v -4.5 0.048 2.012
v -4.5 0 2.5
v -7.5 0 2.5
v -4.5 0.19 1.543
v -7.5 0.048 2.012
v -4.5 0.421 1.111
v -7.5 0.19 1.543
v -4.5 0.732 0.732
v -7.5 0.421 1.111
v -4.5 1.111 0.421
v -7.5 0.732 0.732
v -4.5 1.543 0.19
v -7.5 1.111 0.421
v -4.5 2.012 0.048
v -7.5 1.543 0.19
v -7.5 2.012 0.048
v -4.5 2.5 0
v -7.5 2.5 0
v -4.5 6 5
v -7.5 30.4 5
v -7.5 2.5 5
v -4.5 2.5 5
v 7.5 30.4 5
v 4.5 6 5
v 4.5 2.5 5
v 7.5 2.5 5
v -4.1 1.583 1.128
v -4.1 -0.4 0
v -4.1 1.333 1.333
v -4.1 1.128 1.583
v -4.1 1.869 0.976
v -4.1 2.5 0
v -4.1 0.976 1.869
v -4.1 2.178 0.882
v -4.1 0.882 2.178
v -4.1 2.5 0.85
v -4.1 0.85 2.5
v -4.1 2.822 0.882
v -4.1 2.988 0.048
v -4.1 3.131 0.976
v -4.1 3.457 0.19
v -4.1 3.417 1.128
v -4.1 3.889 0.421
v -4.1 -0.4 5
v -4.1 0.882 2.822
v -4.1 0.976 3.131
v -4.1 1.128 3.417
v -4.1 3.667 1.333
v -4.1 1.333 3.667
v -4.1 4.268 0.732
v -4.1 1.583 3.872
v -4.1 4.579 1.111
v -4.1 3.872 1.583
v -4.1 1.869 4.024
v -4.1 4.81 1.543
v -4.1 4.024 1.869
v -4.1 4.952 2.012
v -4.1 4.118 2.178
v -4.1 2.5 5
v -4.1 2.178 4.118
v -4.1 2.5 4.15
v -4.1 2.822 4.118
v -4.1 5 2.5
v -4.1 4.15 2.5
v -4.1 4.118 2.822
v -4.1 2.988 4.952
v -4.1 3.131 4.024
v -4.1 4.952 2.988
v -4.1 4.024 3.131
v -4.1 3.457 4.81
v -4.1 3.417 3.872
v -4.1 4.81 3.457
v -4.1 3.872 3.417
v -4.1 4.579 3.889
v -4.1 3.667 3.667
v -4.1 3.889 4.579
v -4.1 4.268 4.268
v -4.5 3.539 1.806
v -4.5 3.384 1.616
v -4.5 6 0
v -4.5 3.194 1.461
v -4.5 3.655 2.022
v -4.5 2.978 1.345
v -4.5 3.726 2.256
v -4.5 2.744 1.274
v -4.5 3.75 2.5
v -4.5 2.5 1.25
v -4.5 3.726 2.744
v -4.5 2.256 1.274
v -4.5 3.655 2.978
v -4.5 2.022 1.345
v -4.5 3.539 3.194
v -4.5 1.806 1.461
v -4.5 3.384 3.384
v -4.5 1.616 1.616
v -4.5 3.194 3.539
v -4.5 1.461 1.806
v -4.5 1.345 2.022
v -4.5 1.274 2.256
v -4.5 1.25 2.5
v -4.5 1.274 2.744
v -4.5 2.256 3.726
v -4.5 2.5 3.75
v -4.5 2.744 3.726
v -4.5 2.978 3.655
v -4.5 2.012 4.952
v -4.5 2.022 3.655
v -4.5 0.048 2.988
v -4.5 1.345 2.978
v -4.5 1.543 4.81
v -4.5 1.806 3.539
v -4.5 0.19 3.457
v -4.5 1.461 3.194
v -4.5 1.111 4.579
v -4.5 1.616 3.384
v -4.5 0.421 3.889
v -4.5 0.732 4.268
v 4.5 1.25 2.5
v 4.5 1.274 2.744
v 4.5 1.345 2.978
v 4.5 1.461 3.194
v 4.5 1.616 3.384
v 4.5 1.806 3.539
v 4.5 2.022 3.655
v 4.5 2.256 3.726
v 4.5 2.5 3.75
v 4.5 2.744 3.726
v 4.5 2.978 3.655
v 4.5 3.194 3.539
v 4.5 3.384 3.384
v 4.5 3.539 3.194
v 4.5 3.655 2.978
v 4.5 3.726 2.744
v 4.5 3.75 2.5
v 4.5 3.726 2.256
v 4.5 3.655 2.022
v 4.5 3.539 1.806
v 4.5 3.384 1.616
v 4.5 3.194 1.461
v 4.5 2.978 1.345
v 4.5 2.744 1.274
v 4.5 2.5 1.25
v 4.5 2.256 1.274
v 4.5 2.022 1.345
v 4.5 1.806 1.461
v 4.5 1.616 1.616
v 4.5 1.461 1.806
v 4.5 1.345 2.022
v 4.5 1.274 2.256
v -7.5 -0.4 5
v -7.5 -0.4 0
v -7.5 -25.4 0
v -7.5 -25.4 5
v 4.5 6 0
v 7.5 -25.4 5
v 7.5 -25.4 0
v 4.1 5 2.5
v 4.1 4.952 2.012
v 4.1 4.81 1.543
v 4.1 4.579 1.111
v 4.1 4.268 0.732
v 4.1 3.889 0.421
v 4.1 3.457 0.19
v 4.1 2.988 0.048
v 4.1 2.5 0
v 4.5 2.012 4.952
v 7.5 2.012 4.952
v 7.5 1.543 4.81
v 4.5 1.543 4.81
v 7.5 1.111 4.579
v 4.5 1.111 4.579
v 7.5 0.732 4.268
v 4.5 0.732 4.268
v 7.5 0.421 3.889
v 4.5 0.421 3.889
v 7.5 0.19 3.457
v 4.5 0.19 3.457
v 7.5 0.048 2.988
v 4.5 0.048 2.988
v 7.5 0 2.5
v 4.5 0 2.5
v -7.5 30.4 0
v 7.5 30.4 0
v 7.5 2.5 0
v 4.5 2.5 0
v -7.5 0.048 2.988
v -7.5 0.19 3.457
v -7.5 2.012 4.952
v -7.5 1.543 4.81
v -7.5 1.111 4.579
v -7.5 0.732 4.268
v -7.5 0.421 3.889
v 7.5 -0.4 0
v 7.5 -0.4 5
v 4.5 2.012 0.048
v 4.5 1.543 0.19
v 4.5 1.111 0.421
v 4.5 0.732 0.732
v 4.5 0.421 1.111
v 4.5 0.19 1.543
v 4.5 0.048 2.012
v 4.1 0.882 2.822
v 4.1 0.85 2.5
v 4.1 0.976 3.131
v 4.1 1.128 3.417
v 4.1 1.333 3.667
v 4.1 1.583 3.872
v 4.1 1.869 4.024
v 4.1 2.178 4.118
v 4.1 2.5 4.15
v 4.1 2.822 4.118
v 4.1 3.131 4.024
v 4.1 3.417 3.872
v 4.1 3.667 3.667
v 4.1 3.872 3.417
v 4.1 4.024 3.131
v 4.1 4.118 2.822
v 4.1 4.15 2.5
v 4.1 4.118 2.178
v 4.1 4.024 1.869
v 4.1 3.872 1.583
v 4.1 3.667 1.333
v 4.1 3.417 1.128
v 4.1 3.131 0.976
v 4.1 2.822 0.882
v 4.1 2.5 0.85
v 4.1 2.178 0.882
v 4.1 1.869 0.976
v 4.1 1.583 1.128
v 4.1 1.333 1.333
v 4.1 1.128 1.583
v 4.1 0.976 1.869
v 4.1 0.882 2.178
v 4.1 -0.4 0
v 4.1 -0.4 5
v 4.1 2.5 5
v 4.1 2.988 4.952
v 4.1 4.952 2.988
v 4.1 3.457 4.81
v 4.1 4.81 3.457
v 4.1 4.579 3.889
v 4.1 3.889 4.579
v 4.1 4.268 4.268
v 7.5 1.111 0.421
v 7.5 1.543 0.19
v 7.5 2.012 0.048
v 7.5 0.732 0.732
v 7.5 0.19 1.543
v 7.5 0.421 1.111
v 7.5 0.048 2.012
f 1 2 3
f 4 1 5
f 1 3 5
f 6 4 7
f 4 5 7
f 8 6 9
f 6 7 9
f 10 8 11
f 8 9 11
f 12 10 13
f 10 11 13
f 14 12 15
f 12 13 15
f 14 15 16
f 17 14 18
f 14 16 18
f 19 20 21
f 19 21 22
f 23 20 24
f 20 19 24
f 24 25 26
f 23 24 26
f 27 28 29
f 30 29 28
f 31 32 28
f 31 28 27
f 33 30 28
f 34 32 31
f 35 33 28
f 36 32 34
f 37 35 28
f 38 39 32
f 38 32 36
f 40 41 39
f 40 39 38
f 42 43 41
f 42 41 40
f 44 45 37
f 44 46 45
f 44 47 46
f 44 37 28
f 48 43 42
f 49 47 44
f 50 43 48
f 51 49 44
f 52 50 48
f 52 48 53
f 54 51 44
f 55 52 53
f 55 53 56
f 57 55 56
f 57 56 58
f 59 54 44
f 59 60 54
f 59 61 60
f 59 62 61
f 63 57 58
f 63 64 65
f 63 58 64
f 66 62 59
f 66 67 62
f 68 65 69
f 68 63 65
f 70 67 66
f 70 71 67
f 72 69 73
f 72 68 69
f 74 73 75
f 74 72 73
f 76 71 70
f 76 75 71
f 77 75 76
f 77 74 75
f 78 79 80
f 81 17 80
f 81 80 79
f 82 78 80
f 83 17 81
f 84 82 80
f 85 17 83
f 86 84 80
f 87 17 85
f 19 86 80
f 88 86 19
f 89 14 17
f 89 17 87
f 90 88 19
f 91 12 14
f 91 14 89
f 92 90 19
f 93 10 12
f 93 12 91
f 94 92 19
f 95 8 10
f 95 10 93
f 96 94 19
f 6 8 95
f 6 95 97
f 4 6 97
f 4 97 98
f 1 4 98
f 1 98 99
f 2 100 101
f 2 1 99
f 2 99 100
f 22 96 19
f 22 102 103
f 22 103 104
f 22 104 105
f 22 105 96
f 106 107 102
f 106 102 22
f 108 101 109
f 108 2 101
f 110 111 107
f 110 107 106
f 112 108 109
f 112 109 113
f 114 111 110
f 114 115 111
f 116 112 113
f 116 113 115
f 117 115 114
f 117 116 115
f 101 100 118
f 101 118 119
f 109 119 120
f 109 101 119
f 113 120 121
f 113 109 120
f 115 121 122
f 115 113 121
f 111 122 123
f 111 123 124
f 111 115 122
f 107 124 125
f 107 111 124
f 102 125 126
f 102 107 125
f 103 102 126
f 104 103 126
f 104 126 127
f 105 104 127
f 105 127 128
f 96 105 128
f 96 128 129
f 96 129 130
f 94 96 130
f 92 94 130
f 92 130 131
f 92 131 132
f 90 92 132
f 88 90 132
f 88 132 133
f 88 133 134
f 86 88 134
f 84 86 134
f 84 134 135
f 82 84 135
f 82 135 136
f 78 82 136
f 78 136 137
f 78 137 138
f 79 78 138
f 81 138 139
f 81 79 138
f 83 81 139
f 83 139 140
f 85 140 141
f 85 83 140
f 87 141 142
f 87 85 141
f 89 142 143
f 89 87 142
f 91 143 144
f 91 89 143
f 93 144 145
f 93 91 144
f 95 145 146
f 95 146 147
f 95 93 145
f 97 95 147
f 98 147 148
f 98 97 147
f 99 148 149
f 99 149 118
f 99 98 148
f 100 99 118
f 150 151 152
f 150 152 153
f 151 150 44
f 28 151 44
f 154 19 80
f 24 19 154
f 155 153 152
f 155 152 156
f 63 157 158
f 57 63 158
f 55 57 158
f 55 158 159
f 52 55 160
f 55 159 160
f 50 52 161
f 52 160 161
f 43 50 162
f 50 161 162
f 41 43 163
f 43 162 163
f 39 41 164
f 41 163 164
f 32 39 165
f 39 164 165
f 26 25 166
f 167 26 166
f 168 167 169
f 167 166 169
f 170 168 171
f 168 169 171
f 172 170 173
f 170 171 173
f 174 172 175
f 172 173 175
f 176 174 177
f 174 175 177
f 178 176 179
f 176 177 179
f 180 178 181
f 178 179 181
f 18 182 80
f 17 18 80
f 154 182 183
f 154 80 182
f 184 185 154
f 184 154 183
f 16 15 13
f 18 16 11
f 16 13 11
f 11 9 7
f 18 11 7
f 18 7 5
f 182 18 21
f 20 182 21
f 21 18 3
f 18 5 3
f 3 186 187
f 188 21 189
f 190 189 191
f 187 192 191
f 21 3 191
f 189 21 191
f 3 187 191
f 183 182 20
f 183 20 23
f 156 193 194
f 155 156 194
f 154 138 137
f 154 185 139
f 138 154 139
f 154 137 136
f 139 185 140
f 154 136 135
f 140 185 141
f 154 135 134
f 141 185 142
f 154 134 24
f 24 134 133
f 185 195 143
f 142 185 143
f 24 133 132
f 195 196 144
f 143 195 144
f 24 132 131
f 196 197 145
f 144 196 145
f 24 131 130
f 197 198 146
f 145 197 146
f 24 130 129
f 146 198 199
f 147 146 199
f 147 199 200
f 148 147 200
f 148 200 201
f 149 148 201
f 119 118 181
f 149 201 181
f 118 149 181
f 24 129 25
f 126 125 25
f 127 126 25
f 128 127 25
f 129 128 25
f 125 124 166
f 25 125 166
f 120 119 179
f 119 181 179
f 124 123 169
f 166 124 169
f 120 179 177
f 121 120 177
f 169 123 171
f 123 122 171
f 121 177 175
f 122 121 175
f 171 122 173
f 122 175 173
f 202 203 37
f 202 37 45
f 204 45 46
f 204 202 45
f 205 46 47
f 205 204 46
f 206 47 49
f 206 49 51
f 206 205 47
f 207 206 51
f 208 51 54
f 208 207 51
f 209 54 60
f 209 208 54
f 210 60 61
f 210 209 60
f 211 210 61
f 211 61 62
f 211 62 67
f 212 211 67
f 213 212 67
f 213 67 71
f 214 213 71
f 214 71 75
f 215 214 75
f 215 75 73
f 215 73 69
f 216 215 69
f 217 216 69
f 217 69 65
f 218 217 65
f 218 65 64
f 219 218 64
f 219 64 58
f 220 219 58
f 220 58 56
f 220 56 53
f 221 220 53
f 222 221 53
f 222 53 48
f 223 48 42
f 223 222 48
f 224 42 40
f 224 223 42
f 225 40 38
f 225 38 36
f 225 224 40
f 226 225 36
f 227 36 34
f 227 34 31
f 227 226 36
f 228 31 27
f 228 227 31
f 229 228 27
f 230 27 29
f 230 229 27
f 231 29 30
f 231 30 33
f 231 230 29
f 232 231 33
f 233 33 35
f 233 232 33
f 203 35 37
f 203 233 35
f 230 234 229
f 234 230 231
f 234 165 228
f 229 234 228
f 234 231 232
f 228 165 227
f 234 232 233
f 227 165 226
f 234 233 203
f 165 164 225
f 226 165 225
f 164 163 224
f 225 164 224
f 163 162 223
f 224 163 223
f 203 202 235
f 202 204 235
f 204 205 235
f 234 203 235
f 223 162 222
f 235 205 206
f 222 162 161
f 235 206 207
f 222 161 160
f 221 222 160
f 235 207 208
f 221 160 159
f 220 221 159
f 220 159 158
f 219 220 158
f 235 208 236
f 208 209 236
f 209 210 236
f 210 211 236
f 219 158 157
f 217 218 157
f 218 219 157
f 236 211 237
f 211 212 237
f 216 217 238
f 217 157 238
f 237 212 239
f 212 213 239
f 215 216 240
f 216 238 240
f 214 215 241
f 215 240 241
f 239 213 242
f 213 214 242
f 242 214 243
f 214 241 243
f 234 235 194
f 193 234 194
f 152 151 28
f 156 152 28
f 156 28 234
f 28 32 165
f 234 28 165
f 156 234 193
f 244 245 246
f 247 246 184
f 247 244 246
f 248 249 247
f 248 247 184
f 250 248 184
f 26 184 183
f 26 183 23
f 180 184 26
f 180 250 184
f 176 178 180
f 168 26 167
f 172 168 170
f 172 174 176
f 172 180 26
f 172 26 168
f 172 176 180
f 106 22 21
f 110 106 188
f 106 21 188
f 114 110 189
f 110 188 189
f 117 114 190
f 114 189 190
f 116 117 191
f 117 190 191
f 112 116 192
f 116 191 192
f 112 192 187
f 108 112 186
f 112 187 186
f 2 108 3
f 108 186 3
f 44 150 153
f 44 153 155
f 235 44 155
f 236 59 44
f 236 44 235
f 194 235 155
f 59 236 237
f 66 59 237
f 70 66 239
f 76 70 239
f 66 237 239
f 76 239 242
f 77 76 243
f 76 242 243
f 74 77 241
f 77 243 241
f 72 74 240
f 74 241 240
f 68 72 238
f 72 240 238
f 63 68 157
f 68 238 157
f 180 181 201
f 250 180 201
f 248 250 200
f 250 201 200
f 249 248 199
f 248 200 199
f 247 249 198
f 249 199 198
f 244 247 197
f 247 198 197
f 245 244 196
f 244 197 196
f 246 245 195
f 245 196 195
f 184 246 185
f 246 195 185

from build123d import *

# Parameters (mm, degrees)
F0_W      = 15
F0_H      = 25
F1_DEPTH  = 5
F2_W      = 9
F2_H      = 5
F3_DEPTH  = 6
F5_DEPTH  = 15
F4_R      = 1.25
F6_DEPTH  = 15
F7_R      = 1.65
F8_DEPTH  = 9
F9_DEPTH  = 0.4
F10_DEPTH = 0.4
F11_DEPTH = 0.4
F12_W     = 15
F12_H     = 5
F13_DEPTH = 25
F14_DEPTH = 5.4


with BuildPart() as f1:
    # F0 (on Top) → F1 (new body)
    with BuildSketch(Plane.XY):
        with Locations((0, 12.5)):
            Rectangle(F0_W, F0_H)
    extrude(amount=F1_DEPTH)

    # F2 (on face) → F3 (cut)
    with BuildSketch(Plane.XZ):
        with Locations((0, 2.5)):
            Rectangle(F2_W, F2_H)
    extrude(amount=-F3_DEPTH, mode=Mode.SUBTRACT)

    # F4 (on face) → F5 (cut, through all)
    with BuildSketch(Plane(origin=(-7.5, 0, 0), x_dir=(0, -1, 0), z_dir=(-1, 0, 0))):
        with BuildLine():
            ThreePointArc((-2.5, 5), (-0.732233047, 4.267766953), (0, 2.5))
            Line((0, 2.5), (0, 5))
            Line((0, 5), (-2.5, 5))
        make_face()
        with BuildLine():
            Line((0, 0), (0, 2.5))
            ThreePointArc((0, 2.5), (-0.732233047, 0.732233047), (-2.5, 0))
            Line((-2.5, 0), (0, 0))
        make_face()
    extrude(amount=-F5_DEPTH, mode=Mode.SUBTRACT)

    # F4 (on face) → F6 (join, through all)
    with BuildSketch(Plane(origin=(-7.5, 0, 0), x_dir=(0, -1, 0), z_dir=(-1, 0, 0))):
        with Locations((-2.5, 2.5)):
            Circle(F4_R)
    extrude(amount=-F6_DEPTH)

    # F14 (add): a face of the model
    f14_faces = [f1.faces().sort_by_distance(p)[0] for p in [
        (0, 25, 2.5),
    ]]
    extrude(f14_faces, amount=F14_DEPTH)


with BuildPart() as f8:
    # F7 (on face) → F8 (new body, through all)
    with BuildSketch(Plane(origin=(4.5, 0, 0), x_dir=(0, -1, 0), z_dir=(-1, 0, 0))):
        with BuildLine():
            ThreePointArc((0, 2.5), (-0.732233047, 4.267766953), (-2.5, 5))
            ThreePointArc((-2.5, 5), (-4.267766953, 4.267766953), (-5, 2.5))
            ThreePointArc((-5, 2.5), (-4.267766953, 0.732233047), (-2.5, 0))
            ThreePointArc((-2.5, 0), (-0.732233047, 0.732233047), (0, 2.5))
        make_face()
        with Locations((-2.5, 2.5)):
            Circle(F7_R, mode=Mode.SUBTRACT)
        with BuildLine():
            Line((0, 2.5), (0, 5))
            Line((0, 5), (-2.5, 5))
            ThreePointArc((-2.5, 5), (-0.732233047, 4.267766953), (0, 2.5))
        make_face()
        with BuildLine():
            Line((0, 0), (0, 2.5))
            ThreePointArc((0, 2.5), (-0.732233047, 0.732233047), (-2.5, 0))
            Line((-2.5, 0), (0, 0))
        make_face()
    extrude(amount=F8_DEPTH)

    # F9 (cut): a face of the model
    f9_faces = [f8.faces().sort_by_distance(p)[0] for p in [
        (-4.5, 4.9292893219, 2.5),
    ]]
    extrude(f9_faces, amount=-F9_DEPTH, mode=Mode.SUBTRACT)

    # F10 (cut): a face of the model
    f10_faces = [f8.faces().sort_by_distance(p)[0] for p in [
        (4.5, 4.9292893219, 2.5),
    ]]
    extrude(f10_faces, amount=-F10_DEPTH, mode=Mode.SUBTRACT)

    # F11 (add): a face of the model
    f11_faces = [f8.faces().sort_by_distance(p)[0] for p in [
        (0, 0, 2.5),
    ]]
    extrude(f11_faces, amount=F11_DEPTH)

    # F12 (on face) → F13 (join)
    with BuildSketch(Plane.XZ.offset(0.4)):
        with Locations((0, 2.5)):
            Rectangle(F12_W, F12_H)
    extrude(amount=F13_DEPTH)


solid = Compound([f1.part, f8.part])
